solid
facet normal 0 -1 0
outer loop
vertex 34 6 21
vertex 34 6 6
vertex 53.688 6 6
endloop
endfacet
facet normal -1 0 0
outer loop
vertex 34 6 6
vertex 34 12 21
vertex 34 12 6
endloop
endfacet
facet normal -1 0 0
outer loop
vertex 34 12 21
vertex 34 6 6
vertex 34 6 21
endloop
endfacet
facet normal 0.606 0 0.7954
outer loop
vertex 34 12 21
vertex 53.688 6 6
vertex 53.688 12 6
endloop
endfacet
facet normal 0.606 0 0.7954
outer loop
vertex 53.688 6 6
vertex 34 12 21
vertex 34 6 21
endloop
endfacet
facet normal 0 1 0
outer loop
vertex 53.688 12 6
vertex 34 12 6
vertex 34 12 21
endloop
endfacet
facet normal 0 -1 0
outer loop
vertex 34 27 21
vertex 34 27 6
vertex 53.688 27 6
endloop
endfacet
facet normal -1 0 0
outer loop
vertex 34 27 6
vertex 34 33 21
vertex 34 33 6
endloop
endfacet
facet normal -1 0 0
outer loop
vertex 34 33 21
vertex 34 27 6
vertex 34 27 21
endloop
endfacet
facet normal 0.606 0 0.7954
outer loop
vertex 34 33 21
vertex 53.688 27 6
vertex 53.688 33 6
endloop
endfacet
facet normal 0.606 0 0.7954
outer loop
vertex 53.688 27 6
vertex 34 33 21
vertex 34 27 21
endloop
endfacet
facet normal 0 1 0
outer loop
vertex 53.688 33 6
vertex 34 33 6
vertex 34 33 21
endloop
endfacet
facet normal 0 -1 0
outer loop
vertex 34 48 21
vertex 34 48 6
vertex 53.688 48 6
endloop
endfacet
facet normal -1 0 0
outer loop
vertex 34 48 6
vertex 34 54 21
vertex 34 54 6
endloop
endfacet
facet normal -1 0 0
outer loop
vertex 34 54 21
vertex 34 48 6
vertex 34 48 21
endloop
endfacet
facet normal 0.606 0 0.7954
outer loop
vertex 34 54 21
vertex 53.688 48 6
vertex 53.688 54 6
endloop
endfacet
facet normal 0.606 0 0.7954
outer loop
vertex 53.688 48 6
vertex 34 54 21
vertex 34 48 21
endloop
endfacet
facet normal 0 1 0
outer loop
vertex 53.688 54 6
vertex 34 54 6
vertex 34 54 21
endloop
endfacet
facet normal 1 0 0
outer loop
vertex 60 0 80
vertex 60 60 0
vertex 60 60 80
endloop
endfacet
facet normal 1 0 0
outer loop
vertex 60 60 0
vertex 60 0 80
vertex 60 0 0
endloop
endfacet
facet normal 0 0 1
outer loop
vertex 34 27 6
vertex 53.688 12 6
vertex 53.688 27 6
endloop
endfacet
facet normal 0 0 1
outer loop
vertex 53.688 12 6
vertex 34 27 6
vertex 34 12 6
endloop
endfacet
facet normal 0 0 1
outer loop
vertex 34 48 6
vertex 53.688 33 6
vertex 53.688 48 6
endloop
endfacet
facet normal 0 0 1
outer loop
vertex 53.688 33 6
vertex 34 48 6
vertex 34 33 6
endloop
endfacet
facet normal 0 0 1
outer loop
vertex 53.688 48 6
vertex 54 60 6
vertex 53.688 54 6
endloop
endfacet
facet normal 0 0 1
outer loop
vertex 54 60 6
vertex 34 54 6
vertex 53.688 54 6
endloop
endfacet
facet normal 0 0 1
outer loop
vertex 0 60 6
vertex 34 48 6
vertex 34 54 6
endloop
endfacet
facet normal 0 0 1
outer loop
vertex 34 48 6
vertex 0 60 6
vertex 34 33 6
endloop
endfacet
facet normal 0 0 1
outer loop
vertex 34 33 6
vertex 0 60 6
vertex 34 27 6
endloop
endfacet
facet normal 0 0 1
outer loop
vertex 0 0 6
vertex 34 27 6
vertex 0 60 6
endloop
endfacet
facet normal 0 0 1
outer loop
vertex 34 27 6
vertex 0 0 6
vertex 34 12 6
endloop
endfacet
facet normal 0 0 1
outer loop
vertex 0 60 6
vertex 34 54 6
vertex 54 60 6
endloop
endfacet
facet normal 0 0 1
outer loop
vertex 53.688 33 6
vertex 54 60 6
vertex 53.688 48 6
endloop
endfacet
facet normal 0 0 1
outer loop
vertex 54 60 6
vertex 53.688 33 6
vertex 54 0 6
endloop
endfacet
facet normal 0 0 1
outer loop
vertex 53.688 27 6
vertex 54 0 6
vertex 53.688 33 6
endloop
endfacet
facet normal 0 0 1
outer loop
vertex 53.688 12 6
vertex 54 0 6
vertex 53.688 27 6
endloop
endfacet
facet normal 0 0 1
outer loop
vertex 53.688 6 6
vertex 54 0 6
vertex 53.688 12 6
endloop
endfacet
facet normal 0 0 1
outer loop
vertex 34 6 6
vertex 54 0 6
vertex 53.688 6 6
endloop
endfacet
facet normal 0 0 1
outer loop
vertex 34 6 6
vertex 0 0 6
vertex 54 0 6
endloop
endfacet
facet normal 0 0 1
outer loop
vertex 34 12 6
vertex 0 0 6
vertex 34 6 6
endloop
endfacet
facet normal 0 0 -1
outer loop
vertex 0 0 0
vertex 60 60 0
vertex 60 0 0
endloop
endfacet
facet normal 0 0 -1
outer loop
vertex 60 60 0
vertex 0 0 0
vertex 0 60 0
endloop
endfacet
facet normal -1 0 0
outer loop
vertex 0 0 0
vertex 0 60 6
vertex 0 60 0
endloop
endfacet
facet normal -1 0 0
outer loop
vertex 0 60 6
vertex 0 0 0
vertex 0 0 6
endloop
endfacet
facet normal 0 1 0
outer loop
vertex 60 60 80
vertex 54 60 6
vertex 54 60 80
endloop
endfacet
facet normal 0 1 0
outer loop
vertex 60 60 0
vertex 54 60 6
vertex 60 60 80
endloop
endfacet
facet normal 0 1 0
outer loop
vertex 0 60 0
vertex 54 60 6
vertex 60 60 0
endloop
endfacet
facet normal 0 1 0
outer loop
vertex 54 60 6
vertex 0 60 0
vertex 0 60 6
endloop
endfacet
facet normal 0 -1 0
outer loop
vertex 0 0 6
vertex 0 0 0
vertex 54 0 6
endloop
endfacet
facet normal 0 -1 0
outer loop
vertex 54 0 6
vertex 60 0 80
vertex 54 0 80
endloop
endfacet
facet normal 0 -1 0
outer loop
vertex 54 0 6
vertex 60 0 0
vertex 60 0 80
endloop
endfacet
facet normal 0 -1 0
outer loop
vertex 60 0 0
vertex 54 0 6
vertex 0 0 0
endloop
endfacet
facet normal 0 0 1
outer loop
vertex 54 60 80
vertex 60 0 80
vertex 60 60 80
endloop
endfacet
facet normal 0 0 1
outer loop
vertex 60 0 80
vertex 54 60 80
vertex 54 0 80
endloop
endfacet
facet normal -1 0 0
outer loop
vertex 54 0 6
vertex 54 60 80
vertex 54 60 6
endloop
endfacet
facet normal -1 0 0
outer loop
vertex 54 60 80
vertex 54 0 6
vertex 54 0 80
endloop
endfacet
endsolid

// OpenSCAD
$fn = 32;

// ----------------------------------------------------------------------
// Rib bracket: 3-gusset L bracket
// ----------------------------------------------------------------------

// --- parameters (mm) ---
base_l = 60;              // foot length, X
base_w = 60;              // foot width, Y
base_t = 6;               // foot thickness
plate_t = 6;              // upright plate thickness
plate_h = 80;             // overall height
gus_l = 20;               // gusset leg along the foot
gus_h = 16;               // gusset height
gus_t = 6;                // gusset thickness
gus_edge = 6;             // gusset margin from the foot edge
n_gus = 3;                // gusset count

gus_pitch = (base_w - 2 * gus_edge - gus_t) / (n_gus - 1);  // gusset pitch

union() {
  cube([base_l, base_w, base_t]);
  translate([base_l - plate_t, 0, base_t - 1])
    cube([plate_t, base_w, plate_h - base_t + 1]);
  for (i = [0 : n_gus - 1])
    translate([base_l - plate_t - gus_l, gus_edge + i * gus_pitch, base_t - 1])
      rotate([-90, 0, 0])
        linear_extrude(height = gus_t)
          polygon(points = [[0, 0], [gus_l + 1, 0], [0, -gus_h]]);
}
